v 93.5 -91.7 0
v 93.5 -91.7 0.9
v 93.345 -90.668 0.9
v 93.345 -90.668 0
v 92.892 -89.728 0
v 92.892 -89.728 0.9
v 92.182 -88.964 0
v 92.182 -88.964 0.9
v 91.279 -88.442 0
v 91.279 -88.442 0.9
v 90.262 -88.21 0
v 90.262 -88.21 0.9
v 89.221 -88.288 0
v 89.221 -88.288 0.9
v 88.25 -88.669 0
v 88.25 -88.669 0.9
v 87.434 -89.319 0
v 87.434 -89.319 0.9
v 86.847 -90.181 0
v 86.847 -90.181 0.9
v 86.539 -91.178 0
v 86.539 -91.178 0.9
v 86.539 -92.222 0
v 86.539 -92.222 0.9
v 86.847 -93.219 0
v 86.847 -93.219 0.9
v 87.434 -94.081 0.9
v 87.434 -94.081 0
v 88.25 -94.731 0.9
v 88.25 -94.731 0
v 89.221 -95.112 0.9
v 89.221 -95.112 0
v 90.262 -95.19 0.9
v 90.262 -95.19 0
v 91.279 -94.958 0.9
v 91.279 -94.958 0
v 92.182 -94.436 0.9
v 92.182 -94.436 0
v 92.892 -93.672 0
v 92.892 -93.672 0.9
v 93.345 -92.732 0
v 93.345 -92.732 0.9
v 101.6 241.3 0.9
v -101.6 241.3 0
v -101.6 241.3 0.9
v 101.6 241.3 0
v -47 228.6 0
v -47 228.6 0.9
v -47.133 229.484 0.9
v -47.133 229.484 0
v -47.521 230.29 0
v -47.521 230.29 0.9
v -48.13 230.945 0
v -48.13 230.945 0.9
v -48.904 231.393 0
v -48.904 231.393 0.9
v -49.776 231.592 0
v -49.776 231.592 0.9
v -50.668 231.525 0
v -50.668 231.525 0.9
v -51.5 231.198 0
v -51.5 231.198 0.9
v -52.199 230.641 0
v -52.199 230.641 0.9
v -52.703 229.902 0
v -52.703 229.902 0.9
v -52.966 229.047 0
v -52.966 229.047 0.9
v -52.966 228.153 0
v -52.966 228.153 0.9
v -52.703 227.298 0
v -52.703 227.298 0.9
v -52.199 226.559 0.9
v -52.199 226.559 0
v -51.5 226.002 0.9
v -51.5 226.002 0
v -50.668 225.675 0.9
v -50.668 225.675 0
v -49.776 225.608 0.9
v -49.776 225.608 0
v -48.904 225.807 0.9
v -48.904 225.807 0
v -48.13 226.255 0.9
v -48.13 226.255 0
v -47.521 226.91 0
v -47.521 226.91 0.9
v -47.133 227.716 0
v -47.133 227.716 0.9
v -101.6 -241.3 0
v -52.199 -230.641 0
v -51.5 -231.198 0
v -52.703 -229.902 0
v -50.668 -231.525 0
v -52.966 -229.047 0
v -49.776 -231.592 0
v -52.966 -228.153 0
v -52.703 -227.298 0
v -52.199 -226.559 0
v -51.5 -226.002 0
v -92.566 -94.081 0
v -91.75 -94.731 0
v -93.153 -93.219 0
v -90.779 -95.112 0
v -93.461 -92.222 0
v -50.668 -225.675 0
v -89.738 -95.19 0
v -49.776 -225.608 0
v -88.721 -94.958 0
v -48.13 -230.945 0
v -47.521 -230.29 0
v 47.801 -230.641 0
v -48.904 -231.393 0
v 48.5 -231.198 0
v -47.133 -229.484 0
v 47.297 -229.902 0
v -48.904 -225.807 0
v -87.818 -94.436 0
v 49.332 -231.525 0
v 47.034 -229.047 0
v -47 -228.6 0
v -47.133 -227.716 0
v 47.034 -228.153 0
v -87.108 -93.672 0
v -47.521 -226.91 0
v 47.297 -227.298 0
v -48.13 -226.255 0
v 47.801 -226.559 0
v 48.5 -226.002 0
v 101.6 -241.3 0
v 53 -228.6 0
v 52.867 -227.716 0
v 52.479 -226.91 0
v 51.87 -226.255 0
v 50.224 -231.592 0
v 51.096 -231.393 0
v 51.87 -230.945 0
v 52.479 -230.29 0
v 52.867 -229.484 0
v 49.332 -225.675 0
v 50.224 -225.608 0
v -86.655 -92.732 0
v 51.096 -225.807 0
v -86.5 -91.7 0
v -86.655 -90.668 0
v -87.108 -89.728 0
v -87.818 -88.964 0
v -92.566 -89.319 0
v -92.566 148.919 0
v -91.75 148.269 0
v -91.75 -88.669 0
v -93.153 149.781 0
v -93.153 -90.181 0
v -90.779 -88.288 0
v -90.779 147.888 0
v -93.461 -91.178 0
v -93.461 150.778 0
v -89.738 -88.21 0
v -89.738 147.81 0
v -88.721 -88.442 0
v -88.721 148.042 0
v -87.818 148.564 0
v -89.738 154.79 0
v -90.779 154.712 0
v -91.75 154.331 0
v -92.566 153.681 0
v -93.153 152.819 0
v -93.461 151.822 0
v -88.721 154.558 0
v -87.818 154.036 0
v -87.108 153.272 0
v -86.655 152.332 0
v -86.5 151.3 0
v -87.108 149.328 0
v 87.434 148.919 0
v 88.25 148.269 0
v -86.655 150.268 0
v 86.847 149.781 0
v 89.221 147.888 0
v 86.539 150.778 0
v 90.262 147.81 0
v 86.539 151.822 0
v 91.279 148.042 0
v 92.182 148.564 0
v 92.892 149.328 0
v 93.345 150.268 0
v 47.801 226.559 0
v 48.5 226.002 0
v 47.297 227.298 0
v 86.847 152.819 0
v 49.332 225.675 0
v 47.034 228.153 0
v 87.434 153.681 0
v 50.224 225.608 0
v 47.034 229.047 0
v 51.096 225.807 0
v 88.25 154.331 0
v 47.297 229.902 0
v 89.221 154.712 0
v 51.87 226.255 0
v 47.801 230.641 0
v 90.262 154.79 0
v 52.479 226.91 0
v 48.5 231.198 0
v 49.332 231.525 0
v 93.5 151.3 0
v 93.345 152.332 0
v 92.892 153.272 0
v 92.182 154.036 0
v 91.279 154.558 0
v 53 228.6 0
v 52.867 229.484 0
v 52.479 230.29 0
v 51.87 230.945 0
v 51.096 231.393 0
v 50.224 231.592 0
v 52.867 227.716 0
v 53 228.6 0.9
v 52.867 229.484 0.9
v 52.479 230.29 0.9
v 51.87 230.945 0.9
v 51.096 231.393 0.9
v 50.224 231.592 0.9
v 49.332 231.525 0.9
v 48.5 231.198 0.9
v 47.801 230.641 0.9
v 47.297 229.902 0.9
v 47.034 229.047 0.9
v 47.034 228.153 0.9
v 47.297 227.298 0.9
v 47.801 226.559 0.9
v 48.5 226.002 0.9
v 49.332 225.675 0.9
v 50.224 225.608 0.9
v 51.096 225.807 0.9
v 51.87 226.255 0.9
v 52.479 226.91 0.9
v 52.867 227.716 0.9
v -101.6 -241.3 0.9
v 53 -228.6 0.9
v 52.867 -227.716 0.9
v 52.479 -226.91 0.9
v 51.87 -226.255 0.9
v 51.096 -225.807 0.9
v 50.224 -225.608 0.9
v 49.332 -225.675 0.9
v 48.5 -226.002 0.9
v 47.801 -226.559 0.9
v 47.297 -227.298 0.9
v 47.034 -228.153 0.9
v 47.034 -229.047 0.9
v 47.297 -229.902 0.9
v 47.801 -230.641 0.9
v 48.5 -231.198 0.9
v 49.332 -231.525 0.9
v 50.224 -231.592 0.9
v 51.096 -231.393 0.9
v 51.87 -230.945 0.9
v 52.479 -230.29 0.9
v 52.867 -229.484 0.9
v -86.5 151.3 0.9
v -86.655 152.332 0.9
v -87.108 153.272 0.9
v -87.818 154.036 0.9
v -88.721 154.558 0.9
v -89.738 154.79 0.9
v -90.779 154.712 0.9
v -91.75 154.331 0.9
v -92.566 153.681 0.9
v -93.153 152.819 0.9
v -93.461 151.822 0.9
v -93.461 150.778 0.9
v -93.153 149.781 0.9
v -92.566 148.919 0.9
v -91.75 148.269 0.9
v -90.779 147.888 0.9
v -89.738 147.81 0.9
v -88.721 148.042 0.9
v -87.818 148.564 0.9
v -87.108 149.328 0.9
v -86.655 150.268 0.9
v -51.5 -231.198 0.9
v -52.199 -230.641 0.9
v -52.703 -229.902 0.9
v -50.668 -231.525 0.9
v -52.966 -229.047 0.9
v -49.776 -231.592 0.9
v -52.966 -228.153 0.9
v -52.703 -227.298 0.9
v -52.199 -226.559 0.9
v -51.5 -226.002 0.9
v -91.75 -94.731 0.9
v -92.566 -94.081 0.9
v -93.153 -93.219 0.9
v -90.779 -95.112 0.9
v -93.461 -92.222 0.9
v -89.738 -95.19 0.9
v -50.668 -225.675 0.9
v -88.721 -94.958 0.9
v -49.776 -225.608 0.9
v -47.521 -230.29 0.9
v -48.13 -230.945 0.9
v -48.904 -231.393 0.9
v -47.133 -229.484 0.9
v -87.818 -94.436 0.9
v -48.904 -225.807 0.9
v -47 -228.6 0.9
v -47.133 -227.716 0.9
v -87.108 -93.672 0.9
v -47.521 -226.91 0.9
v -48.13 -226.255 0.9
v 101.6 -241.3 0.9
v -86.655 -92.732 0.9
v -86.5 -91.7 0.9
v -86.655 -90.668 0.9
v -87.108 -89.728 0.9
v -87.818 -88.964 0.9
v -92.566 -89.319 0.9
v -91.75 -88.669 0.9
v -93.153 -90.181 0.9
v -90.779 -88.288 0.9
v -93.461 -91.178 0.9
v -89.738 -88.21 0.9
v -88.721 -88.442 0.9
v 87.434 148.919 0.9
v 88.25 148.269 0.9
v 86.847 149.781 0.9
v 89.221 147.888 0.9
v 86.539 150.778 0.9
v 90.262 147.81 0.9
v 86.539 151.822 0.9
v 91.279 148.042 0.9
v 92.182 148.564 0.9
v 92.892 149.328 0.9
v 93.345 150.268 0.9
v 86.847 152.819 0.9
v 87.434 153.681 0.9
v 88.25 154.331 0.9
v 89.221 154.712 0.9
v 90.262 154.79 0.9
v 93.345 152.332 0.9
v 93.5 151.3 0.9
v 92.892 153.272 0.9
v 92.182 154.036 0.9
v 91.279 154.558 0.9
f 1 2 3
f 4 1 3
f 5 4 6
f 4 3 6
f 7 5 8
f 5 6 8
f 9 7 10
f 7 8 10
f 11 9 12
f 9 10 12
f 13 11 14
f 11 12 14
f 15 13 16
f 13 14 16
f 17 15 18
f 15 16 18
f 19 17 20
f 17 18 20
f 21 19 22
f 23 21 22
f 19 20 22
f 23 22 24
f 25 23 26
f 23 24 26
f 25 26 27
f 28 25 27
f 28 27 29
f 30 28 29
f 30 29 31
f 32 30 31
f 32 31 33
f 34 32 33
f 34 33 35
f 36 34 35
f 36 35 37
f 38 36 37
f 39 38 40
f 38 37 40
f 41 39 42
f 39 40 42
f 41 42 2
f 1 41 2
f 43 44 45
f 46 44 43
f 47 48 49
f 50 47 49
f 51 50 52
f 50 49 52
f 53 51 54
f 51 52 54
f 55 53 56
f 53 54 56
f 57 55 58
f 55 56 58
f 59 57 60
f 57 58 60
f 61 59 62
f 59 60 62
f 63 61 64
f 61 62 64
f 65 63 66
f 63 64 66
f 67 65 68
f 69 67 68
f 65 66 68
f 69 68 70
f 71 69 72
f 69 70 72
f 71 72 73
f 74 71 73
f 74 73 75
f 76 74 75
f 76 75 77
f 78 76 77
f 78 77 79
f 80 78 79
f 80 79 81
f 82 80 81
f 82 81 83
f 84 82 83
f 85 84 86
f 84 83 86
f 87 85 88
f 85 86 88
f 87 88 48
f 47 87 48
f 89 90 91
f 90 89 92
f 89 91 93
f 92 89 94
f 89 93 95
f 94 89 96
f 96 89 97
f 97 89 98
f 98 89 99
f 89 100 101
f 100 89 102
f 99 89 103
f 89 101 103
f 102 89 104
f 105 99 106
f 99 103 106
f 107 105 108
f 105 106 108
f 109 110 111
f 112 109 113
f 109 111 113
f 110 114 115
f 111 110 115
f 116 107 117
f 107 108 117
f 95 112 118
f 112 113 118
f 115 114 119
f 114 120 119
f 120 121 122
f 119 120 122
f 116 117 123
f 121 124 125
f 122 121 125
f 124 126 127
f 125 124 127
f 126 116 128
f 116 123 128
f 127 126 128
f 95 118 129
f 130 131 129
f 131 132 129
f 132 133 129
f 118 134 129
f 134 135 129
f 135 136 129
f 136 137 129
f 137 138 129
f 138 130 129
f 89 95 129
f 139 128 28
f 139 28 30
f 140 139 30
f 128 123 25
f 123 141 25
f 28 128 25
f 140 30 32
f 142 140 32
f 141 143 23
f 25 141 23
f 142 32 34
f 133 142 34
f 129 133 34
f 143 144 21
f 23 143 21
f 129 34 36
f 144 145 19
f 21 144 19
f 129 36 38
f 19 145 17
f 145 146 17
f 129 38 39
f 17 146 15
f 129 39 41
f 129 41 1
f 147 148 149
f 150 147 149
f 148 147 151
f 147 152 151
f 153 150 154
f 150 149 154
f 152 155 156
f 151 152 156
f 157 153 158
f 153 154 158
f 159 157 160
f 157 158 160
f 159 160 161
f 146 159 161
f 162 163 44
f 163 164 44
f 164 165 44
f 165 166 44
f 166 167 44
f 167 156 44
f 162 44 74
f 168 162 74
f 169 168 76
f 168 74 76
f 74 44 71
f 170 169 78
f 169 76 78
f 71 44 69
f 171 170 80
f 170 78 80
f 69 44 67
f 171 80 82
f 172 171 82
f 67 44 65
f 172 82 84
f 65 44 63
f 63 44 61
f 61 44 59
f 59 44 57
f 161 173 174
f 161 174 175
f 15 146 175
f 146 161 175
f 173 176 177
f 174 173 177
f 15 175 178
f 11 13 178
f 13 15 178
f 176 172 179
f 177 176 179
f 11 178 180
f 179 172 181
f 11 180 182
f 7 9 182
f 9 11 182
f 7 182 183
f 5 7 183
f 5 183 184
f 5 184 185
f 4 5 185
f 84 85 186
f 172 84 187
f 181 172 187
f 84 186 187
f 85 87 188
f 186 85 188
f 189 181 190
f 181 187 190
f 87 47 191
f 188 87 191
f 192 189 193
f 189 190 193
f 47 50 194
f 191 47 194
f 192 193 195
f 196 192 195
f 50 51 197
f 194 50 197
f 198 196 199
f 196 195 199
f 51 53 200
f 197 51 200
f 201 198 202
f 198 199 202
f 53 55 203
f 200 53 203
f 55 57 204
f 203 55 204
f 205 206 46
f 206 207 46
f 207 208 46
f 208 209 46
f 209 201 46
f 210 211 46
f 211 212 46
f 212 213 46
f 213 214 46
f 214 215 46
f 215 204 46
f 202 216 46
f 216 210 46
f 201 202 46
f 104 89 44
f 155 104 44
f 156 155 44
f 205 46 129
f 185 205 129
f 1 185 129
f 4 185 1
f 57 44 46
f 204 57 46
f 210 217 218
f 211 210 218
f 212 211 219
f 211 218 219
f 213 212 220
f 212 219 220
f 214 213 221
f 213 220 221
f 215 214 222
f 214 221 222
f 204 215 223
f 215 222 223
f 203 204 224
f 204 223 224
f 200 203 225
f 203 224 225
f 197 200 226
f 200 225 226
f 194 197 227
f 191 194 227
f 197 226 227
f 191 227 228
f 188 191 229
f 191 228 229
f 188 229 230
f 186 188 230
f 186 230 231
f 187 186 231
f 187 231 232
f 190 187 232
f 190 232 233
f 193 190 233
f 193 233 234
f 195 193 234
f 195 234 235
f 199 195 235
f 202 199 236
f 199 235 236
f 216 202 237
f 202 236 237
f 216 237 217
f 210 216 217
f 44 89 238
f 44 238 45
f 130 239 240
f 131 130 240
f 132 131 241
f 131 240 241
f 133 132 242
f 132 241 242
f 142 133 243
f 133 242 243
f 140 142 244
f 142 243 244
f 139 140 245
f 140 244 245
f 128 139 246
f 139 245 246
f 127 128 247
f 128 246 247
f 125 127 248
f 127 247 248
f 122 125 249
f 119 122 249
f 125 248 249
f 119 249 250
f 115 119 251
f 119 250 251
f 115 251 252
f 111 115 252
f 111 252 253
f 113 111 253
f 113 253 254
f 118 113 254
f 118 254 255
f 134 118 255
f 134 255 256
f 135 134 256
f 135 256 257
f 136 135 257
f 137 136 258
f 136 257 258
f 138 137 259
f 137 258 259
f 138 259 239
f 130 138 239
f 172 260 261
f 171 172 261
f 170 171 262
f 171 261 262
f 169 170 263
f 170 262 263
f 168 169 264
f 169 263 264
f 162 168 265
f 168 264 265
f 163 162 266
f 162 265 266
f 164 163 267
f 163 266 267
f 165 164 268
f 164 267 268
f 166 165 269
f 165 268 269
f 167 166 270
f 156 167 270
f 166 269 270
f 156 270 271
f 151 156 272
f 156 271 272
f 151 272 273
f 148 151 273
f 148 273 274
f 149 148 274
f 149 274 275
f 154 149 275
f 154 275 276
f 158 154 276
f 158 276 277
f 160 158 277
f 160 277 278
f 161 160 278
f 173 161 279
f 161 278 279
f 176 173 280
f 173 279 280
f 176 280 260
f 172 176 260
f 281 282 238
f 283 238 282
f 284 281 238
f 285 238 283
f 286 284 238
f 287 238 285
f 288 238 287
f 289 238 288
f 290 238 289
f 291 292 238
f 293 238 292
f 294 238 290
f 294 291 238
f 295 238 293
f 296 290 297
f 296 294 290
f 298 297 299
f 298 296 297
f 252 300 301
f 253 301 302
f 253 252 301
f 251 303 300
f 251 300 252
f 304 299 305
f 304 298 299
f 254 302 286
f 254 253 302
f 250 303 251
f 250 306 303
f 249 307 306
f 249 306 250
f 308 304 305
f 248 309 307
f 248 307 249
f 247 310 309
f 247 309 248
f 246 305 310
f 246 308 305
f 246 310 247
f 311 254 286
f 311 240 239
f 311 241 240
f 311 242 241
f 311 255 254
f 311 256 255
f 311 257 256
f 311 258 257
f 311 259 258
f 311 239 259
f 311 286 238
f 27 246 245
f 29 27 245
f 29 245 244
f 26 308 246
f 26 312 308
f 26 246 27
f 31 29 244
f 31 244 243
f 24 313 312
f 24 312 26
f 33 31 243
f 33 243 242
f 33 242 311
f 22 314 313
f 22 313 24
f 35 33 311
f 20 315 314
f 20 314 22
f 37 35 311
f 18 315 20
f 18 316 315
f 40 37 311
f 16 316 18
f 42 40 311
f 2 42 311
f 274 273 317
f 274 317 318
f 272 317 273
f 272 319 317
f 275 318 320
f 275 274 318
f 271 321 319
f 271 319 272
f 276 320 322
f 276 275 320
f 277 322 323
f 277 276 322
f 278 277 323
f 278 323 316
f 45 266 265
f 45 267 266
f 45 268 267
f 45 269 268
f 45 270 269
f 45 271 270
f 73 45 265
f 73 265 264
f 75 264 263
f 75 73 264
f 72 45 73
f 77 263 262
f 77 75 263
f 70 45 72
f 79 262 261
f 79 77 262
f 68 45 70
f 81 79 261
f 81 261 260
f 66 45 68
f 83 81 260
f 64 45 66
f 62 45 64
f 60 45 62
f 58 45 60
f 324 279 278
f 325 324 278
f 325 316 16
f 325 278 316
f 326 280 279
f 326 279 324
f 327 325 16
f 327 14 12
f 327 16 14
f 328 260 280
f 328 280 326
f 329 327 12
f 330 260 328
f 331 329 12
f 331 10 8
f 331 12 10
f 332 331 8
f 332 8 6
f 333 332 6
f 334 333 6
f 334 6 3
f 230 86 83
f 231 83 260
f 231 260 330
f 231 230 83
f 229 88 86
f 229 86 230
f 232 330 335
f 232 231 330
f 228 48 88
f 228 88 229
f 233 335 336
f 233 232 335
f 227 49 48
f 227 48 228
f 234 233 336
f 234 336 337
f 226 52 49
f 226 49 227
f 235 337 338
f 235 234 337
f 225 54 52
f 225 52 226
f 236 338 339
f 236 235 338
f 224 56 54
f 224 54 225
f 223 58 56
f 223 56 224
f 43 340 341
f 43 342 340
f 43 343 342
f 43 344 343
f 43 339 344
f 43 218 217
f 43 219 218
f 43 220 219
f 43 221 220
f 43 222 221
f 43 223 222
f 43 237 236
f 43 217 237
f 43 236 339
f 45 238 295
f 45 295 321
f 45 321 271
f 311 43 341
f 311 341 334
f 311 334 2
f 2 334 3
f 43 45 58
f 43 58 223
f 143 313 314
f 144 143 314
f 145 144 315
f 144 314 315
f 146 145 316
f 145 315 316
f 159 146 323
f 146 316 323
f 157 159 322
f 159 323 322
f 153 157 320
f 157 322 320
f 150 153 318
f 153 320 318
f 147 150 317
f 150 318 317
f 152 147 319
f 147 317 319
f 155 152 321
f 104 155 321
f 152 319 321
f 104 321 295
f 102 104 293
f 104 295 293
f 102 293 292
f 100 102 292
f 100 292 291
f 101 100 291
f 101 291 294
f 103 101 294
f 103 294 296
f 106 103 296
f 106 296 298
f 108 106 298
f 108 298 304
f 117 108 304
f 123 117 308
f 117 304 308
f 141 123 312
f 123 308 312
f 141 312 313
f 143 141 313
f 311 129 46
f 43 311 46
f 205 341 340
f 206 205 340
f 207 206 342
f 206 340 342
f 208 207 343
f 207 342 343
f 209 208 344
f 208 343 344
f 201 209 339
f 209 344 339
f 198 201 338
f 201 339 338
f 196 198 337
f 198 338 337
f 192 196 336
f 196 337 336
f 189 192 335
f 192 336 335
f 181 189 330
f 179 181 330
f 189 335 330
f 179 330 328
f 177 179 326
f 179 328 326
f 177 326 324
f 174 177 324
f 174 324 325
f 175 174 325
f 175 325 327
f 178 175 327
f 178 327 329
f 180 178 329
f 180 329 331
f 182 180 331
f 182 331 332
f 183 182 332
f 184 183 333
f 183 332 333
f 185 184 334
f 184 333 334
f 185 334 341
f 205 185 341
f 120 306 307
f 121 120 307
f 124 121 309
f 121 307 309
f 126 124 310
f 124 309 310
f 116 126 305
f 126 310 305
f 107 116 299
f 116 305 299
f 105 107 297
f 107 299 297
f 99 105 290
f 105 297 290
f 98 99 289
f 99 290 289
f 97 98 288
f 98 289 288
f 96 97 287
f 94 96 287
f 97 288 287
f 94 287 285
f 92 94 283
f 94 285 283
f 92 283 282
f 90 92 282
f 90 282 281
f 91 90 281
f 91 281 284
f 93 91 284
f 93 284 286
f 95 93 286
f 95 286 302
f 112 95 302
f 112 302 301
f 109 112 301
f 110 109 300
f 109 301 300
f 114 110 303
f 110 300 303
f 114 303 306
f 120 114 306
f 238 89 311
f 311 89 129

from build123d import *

# Parameters (mm, degrees)
SKETCH_1_W          = 203.2
SKETCH_1_H          = 482.6
EXTRUDE_1_DEPTH     = 0.9
SKETCH_2_R          = 3.5
CUT_EXTRUDE_1_DEPTH = 0.9
SKETCH_3_R          = 3
CUT_EXTRUDE_2_DEPTH = 0.9


with BuildPart() as part:
    # 草图1 → 凸台-拉伸1 (new body)
    with BuildSketch(Plane.XY):
        Rectangle(SKETCH_1_W, SKETCH_1_H)
    extrude(amount=EXTRUDE_1_DEPTH)

    # 草图2 → 切除-拉伸1 (cut)
    with BuildSketch(Plane.XY.offset(0.9)):
        with Locations((-90, 151.3)):
            Circle(SKETCH_2_R)
        with Locations((90, 151.3)):
            Circle(SKETCH_2_R)
        with Locations((90, -91.7)):
            Circle(SKETCH_2_R)
        with Locations((-90, -91.7)):
            Circle(SKETCH_2_R)
    extrude(amount=-CUT_EXTRUDE_1_DEPTH, mode=Mode.SUBTRACT)

    # 草图3 → 切除-拉伸2 (cut)
    with BuildSketch(Plane.XY.offset(0.9)):
        with Locations((-50, 228.6)):
            Circle(SKETCH_3_R)
        with Locations((50, 228.6)):
            Circle(SKETCH_3_R)
        with Locations((50, -228.6)):
            Circle(SKETCH_3_R)
        with Locations((-50, -228.6)):
            Circle(SKETCH_3_R)
    extrude(amount=-CUT_EXTRUDE_2_DEPTH, mode=Mode.SUBTRACT)


solid = part.part
